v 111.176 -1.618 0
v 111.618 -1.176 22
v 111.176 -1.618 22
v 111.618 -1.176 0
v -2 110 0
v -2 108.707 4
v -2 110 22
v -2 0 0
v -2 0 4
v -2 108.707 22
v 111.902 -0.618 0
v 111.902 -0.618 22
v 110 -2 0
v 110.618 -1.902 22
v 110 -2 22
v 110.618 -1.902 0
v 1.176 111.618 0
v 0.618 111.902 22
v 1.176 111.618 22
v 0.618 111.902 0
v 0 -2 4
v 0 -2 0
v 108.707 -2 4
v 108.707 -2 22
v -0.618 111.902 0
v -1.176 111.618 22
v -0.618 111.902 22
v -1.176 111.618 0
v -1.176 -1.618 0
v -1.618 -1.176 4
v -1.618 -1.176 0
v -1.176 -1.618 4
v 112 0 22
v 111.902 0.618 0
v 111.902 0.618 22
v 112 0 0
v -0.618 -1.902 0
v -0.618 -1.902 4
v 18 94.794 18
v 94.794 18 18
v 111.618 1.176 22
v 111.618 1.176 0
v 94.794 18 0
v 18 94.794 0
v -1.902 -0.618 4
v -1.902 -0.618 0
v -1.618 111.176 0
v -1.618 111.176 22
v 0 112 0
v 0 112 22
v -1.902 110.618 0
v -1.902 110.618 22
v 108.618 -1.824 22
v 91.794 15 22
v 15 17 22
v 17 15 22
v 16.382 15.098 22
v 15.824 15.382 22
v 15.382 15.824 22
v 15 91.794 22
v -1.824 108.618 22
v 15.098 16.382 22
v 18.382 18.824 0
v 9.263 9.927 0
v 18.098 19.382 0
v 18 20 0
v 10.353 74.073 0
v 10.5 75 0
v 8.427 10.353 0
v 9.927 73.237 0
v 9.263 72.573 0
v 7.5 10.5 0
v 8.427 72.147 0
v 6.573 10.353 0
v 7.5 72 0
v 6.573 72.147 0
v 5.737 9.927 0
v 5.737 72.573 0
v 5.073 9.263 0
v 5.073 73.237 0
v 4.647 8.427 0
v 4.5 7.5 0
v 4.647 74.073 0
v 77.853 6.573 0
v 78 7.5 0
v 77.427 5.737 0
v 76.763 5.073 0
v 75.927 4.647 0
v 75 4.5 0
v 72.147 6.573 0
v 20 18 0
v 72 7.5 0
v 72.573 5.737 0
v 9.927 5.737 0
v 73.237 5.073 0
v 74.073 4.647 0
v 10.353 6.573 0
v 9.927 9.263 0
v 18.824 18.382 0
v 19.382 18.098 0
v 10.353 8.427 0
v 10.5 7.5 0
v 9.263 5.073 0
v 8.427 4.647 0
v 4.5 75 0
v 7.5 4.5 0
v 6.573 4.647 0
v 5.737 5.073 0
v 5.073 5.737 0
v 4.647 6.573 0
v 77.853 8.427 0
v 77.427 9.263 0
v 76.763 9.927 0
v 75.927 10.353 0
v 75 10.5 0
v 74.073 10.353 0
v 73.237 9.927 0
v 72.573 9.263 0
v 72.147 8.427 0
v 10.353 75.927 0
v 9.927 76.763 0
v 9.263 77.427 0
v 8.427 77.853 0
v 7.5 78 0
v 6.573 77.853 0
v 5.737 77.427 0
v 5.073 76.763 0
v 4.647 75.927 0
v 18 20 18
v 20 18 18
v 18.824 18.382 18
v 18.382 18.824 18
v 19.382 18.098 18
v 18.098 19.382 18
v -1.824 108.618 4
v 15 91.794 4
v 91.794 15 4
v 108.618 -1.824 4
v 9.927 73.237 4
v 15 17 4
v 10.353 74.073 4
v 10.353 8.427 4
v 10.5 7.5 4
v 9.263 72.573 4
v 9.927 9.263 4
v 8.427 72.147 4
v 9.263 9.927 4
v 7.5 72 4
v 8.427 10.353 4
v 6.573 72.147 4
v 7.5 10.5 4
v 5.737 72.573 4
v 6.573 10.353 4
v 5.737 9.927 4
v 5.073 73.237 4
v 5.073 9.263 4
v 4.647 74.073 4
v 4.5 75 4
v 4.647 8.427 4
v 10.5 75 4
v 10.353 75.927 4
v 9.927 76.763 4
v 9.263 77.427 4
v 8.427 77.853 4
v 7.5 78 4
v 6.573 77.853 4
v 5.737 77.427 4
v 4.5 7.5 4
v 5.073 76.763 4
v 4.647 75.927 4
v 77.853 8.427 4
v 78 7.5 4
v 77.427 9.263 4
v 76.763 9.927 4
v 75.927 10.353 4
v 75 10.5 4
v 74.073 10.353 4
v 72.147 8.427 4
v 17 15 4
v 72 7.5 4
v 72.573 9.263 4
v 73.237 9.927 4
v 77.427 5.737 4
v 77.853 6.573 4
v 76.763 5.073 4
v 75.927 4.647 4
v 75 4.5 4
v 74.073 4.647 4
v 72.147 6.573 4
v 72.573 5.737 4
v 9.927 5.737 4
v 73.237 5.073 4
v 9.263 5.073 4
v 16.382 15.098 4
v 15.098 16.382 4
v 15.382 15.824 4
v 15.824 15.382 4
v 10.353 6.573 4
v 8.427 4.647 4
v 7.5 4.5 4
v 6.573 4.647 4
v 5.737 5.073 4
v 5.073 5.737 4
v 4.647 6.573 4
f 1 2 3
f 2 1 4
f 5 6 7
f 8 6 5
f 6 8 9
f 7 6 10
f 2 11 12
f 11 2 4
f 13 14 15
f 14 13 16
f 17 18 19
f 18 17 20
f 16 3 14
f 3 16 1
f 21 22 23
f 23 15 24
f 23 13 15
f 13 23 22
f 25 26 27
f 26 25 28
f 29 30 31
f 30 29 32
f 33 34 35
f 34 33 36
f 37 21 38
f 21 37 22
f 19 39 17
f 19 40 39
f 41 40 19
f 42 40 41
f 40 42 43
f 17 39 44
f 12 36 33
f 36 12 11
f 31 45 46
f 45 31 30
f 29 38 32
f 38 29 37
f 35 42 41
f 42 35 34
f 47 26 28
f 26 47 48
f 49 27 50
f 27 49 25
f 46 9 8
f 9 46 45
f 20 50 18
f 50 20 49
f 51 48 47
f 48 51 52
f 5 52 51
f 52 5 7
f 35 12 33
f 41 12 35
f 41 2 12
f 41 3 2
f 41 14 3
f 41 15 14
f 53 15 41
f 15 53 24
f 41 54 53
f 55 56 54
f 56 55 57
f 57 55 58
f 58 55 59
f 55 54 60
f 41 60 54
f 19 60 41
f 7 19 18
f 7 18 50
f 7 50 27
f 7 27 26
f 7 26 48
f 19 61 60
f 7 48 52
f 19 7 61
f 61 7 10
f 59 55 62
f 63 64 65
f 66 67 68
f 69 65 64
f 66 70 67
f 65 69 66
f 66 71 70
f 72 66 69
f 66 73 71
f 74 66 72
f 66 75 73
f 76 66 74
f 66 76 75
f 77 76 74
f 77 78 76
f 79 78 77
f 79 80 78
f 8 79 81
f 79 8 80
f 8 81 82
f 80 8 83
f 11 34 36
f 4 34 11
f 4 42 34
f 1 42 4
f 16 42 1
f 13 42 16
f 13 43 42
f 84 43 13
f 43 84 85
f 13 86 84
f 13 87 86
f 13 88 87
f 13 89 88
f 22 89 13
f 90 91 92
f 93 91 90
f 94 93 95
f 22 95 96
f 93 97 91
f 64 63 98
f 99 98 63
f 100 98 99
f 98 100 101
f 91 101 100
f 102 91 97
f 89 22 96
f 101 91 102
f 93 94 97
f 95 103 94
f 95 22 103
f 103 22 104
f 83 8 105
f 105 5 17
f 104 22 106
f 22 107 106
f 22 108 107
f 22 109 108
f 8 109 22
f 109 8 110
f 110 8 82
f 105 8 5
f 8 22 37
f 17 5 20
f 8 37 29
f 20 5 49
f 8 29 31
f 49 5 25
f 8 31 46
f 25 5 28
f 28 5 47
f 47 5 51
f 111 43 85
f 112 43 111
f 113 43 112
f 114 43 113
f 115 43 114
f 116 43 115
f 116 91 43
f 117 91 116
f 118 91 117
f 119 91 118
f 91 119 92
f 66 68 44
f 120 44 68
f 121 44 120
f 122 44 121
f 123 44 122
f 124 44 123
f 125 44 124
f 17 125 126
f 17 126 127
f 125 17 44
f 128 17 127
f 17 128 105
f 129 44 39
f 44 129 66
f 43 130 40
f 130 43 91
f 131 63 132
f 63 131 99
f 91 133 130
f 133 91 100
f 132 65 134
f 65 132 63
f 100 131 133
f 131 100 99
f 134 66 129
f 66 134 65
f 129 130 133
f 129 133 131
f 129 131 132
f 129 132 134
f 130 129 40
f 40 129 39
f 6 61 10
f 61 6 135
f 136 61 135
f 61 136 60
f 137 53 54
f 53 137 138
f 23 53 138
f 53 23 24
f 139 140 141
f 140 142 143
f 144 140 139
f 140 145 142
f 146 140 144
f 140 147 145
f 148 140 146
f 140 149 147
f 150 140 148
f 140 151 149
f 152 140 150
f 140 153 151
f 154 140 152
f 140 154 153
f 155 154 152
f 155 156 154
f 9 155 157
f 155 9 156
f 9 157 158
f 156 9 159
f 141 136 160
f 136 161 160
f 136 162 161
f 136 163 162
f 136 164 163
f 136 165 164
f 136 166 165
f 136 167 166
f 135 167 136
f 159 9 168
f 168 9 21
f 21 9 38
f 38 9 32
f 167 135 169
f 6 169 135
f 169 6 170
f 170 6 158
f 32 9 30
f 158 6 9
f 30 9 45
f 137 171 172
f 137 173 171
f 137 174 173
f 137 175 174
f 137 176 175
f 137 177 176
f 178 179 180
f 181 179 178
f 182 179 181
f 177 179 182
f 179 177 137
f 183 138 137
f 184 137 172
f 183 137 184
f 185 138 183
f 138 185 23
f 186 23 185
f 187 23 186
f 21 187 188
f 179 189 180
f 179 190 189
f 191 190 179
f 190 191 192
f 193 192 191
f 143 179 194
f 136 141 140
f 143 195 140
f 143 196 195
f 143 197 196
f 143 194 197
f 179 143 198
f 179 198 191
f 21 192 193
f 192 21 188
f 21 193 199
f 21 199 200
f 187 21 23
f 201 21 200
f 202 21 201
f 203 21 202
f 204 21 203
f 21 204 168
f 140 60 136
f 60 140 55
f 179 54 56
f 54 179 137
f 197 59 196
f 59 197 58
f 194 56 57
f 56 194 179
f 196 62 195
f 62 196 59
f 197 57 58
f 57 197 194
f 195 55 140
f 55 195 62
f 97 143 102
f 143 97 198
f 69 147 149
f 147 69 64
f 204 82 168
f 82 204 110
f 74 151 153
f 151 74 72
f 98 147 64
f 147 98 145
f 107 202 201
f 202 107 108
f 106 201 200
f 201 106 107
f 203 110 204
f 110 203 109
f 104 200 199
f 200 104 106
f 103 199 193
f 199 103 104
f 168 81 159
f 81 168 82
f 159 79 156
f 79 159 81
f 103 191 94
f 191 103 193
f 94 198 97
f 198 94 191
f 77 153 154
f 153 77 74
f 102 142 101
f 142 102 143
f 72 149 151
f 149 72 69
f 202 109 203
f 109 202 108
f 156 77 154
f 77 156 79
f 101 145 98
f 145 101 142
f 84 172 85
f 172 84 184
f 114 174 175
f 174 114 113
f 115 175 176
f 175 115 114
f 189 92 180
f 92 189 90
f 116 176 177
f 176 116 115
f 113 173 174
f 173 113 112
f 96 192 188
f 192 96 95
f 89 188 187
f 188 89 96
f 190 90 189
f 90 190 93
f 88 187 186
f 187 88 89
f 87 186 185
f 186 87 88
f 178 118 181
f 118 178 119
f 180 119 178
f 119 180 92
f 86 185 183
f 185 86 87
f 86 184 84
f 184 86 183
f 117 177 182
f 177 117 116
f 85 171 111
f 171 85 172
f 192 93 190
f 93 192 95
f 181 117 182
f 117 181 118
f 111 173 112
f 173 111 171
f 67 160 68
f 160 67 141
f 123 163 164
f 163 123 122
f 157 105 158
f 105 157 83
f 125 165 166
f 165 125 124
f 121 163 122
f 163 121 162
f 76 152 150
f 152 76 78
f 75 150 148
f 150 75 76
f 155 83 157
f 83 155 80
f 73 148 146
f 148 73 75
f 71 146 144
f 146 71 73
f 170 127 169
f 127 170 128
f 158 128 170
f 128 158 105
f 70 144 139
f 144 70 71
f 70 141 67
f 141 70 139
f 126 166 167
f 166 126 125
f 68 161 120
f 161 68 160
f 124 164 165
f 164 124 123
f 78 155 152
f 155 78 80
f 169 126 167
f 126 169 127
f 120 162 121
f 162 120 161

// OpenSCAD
board_height=16;
thickness = 2;
spacing = 10;
size=100;
screwdiameter=3;
screwspacing=spacing*0.75;

module bracket() {
    difference()
    {
        difference()
        {
            minkowski()
            {cylinder(r=thickness,h=thickness,$fn=20);
            linear_extrude(board_height+thickness*2)
            {
               polygon([[size+(thickness*5),0],[0,size+(thickness*5)],[0,0]]);
            }
        }

            minkowski()
            {cylinder(r=thickness,h=thickness,$fn=20);
            translate([0,0,-thickness]) {
                linear_extrude(board_height+thickness)
                {
                polygon([[size+(thickness*4)+spacing,thickness*5+spacing],[thickness*5+spacing,size+(thickness*4)+spacing],[thickness*5+spacing,thickness*5+spacing]]);
                }
            }
        }
        }
    }
}

    

difference()
{
    bracket();
    translate([thickness-spacing/2,thickness-spacing/2,thickness*2])
        {
    bracket();
    }
    
    //holes
translate([screwspacing,screwspacing,-thickness])
    linear_extrude(thickness*3)
        circle(screwdiameter,$fn=20);

translate([screwspacing*(size/screwspacing*0.75),screwspacing,-thickness])
    linear_extrude(thickness*3)
        circle(screwdiameter,$fn=20);

translate([screwspacing,screwspacing*(size/screwspacing*0.75),-thickness])
    linear_extrude(thickness*3)
        circle(screwdiameter,$fn=20);

}
